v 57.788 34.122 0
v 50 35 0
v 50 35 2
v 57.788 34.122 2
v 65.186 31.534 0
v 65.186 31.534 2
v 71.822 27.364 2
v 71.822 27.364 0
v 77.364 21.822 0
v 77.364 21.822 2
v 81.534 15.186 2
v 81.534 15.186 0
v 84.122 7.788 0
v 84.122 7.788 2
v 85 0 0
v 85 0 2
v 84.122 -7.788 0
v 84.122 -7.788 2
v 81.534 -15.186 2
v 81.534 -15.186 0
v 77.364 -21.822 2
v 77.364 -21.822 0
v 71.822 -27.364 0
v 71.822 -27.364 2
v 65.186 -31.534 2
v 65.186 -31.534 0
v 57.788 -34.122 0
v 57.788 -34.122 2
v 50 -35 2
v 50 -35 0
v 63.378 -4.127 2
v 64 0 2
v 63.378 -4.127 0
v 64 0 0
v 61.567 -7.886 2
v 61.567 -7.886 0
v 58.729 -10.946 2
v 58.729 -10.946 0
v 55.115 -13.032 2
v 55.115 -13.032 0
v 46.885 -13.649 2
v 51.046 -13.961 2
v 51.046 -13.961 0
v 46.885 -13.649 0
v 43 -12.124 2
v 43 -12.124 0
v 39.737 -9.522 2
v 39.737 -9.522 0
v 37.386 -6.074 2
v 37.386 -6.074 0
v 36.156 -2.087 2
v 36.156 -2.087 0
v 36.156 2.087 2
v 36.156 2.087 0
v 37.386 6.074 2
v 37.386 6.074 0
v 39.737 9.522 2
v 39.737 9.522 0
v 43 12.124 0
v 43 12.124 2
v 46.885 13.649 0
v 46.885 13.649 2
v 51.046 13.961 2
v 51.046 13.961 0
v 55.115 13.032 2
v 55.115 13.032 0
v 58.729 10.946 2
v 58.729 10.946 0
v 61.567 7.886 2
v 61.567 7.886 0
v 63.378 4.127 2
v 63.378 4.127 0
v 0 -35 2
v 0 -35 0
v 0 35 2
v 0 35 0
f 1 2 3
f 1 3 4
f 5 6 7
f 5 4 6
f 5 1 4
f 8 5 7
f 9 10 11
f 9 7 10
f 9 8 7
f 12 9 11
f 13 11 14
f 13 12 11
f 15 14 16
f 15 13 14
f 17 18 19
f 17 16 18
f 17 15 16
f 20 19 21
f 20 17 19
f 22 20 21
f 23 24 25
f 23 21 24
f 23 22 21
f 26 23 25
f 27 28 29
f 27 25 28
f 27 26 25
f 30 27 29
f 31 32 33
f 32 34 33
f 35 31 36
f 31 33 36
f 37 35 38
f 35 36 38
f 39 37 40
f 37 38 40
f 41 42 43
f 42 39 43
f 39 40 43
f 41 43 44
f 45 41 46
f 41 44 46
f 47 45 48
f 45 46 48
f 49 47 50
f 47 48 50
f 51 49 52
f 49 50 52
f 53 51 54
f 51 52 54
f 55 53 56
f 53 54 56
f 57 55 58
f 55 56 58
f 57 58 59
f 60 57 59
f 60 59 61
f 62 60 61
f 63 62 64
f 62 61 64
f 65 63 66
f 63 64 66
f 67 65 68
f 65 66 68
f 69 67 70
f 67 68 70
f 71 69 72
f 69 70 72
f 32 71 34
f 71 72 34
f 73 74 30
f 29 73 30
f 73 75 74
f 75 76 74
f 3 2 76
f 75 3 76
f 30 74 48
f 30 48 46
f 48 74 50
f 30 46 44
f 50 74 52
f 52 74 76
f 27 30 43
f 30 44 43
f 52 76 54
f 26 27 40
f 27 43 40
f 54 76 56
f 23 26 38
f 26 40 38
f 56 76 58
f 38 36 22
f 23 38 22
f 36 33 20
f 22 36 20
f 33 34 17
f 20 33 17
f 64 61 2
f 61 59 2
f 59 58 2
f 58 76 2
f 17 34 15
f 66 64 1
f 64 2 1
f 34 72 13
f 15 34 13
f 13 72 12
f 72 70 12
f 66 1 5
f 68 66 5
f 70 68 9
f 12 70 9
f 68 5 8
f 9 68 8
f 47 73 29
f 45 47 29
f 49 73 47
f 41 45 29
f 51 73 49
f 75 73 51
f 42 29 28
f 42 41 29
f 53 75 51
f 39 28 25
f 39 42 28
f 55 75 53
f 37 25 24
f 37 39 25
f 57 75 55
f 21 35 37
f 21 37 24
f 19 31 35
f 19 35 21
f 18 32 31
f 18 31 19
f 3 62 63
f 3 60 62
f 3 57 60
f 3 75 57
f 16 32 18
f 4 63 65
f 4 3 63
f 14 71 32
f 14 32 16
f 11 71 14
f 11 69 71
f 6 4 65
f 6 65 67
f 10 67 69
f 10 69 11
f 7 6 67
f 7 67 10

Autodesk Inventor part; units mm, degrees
ref_plane "YZ Plane" through (0, 0, 0) normal (1, 0, 0) x (0, 1, 0)
ref_plane "XZ Plane" through (0, 0, 0) normal (0, 1, 0) x (-1, 0, 0)
ref_plane "XY Plane" through (0, 0, 0) normal (0, 0, 1) x (1, 0, 0)
sketch "Sketch1" plane through (0, 0, 0) normal (0, 0, 1) x (1, 0, 0)
  line L0 (0, 35) -> (0, -35)
  line L1 (0, -35) -> (50, -35)
  line L2 (50, 35) -> (0, 35)
  circle A0 centre (50, 0) radius 14
  arc A1 (50, -35) -> (50, 35) centre (50, 0) ccw
  point P0 (0, 0)
  point P1 (0, 0)
  dimension "d11" = 70
  dimension "d12" = 50
  dimension "d14" = 28
extrude "Plate1" add sketch "Sketch1" along normal blind 2
equation "\"d5\" = Thickness"
equation "\"BendReliefWidth\" = Thickness"
equation "\"BendReliefDepth\" = 0.5 * Thickness"
equation "\"CornerReliefSize\" = 4 * Thickness"
equation "\"MinimumRemnant\" = 2 * Thickness"
equation "\"TransitionRadius\" = BendRadius"
equation "\"JacobiRadiusSize\" = BendRadius"
equation "\"GapSize\" = Thickness"
equation "\"Thickness\" = 2"
equation "\"BendRadius\" = 2.75"
properties part number "AKVA MSC 0512 transverse ring1 4mm 304 8pcs" material "Stainless Steel"
